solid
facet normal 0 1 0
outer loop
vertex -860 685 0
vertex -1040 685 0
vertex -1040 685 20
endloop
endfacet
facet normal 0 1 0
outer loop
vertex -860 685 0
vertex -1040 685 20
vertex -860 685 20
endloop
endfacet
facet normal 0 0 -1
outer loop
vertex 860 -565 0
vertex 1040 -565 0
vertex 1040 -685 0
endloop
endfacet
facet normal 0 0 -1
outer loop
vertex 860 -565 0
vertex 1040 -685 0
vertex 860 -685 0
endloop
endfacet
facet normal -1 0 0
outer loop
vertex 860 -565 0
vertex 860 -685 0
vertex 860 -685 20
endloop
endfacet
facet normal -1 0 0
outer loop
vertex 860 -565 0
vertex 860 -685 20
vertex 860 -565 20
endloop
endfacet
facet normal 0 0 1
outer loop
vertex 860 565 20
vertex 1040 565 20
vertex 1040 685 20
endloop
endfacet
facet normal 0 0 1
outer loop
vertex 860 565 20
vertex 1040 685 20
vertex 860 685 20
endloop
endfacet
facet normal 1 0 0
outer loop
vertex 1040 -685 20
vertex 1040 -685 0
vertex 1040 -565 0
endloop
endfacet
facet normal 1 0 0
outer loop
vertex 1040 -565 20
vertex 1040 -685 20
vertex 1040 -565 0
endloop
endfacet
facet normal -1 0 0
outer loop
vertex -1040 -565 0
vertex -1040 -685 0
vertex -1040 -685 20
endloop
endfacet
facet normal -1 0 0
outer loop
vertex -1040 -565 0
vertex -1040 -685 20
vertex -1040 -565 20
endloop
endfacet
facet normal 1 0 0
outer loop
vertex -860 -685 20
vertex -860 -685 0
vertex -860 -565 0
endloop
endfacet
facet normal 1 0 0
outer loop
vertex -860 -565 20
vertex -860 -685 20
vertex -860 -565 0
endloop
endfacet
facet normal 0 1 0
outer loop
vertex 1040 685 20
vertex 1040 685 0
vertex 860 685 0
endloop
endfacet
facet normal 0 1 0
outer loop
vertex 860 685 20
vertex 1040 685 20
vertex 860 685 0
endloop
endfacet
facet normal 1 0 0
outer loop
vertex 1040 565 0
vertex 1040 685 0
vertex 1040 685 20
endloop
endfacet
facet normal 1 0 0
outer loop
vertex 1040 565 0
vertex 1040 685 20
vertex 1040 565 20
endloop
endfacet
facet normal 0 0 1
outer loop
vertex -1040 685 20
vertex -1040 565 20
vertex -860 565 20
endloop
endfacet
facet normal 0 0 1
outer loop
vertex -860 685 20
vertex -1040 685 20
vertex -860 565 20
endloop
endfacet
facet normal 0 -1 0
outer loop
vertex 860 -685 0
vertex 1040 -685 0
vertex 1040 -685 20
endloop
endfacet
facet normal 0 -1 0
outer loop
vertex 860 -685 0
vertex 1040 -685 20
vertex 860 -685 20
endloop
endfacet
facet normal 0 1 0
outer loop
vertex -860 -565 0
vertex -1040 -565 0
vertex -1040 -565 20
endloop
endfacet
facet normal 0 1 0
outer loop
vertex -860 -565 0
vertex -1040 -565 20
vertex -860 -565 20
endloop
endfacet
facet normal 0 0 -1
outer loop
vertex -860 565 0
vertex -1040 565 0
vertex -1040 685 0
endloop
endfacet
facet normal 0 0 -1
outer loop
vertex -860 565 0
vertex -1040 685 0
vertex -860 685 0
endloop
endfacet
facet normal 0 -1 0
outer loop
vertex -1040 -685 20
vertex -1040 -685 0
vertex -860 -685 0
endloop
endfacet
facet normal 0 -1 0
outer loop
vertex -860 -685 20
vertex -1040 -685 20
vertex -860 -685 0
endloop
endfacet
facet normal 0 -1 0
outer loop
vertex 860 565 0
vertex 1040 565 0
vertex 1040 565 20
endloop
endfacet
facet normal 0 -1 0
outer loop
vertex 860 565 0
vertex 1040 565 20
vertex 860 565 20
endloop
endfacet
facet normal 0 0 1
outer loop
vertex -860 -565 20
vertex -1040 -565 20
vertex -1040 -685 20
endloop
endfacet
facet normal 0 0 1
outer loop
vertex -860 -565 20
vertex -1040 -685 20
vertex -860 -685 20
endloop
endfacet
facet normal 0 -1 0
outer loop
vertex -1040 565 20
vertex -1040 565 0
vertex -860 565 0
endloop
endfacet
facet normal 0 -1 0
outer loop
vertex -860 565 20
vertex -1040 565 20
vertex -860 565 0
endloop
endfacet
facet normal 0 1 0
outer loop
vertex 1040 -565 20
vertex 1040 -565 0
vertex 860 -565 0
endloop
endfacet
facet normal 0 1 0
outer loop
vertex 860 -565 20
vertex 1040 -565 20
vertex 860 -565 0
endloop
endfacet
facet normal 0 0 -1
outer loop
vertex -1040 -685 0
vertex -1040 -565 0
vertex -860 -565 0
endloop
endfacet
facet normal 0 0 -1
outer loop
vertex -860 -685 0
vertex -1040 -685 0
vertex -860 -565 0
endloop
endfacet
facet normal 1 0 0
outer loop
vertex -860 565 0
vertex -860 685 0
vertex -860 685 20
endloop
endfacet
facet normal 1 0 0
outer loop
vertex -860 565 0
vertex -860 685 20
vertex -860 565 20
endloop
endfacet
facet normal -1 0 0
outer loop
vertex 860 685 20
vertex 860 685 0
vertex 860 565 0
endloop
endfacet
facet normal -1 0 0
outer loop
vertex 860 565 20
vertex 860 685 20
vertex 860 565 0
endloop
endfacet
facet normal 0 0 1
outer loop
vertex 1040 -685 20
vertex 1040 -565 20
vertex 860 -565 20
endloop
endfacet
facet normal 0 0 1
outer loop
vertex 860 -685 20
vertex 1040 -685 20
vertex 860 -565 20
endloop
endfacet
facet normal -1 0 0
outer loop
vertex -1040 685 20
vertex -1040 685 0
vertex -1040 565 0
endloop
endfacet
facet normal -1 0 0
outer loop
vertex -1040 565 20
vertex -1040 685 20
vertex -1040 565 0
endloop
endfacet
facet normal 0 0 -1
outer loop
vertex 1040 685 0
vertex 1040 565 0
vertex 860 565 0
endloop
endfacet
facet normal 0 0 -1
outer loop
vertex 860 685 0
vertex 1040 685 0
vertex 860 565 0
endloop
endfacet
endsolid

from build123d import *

# Parameters (mm, degrees)
F4_W     = 180
F4_H     = 120
F5_DEPTH = 20


# Not quite as in the source:
# - a feature names something its author has since deleted; it is built from what else it names


with BuildPart() as f5:
    # F4 (on Top) → F5 (new body)
    with BuildSketch(Plane.XY):
        with Locations((-950, -625)):
            Rectangle(F4_W, F4_H)
    extrude(amount=F5_DEPTH)


with BuildPart() as f6_1:
    # F6: instance of F5
    add(f5.part.mirror(Plane.YZ))


with BuildPart() as f7_1:
    # F7: instance of F5
    add(f5.part.mirror(Plane.XZ))


with BuildPart() as f7_2:
    # F7: instance of F6_1
    add(f6_1.part.mirror(Plane.XZ))


solid = Compound([f5.part, f6_1.part, f7_1.part, f7_2.part])
